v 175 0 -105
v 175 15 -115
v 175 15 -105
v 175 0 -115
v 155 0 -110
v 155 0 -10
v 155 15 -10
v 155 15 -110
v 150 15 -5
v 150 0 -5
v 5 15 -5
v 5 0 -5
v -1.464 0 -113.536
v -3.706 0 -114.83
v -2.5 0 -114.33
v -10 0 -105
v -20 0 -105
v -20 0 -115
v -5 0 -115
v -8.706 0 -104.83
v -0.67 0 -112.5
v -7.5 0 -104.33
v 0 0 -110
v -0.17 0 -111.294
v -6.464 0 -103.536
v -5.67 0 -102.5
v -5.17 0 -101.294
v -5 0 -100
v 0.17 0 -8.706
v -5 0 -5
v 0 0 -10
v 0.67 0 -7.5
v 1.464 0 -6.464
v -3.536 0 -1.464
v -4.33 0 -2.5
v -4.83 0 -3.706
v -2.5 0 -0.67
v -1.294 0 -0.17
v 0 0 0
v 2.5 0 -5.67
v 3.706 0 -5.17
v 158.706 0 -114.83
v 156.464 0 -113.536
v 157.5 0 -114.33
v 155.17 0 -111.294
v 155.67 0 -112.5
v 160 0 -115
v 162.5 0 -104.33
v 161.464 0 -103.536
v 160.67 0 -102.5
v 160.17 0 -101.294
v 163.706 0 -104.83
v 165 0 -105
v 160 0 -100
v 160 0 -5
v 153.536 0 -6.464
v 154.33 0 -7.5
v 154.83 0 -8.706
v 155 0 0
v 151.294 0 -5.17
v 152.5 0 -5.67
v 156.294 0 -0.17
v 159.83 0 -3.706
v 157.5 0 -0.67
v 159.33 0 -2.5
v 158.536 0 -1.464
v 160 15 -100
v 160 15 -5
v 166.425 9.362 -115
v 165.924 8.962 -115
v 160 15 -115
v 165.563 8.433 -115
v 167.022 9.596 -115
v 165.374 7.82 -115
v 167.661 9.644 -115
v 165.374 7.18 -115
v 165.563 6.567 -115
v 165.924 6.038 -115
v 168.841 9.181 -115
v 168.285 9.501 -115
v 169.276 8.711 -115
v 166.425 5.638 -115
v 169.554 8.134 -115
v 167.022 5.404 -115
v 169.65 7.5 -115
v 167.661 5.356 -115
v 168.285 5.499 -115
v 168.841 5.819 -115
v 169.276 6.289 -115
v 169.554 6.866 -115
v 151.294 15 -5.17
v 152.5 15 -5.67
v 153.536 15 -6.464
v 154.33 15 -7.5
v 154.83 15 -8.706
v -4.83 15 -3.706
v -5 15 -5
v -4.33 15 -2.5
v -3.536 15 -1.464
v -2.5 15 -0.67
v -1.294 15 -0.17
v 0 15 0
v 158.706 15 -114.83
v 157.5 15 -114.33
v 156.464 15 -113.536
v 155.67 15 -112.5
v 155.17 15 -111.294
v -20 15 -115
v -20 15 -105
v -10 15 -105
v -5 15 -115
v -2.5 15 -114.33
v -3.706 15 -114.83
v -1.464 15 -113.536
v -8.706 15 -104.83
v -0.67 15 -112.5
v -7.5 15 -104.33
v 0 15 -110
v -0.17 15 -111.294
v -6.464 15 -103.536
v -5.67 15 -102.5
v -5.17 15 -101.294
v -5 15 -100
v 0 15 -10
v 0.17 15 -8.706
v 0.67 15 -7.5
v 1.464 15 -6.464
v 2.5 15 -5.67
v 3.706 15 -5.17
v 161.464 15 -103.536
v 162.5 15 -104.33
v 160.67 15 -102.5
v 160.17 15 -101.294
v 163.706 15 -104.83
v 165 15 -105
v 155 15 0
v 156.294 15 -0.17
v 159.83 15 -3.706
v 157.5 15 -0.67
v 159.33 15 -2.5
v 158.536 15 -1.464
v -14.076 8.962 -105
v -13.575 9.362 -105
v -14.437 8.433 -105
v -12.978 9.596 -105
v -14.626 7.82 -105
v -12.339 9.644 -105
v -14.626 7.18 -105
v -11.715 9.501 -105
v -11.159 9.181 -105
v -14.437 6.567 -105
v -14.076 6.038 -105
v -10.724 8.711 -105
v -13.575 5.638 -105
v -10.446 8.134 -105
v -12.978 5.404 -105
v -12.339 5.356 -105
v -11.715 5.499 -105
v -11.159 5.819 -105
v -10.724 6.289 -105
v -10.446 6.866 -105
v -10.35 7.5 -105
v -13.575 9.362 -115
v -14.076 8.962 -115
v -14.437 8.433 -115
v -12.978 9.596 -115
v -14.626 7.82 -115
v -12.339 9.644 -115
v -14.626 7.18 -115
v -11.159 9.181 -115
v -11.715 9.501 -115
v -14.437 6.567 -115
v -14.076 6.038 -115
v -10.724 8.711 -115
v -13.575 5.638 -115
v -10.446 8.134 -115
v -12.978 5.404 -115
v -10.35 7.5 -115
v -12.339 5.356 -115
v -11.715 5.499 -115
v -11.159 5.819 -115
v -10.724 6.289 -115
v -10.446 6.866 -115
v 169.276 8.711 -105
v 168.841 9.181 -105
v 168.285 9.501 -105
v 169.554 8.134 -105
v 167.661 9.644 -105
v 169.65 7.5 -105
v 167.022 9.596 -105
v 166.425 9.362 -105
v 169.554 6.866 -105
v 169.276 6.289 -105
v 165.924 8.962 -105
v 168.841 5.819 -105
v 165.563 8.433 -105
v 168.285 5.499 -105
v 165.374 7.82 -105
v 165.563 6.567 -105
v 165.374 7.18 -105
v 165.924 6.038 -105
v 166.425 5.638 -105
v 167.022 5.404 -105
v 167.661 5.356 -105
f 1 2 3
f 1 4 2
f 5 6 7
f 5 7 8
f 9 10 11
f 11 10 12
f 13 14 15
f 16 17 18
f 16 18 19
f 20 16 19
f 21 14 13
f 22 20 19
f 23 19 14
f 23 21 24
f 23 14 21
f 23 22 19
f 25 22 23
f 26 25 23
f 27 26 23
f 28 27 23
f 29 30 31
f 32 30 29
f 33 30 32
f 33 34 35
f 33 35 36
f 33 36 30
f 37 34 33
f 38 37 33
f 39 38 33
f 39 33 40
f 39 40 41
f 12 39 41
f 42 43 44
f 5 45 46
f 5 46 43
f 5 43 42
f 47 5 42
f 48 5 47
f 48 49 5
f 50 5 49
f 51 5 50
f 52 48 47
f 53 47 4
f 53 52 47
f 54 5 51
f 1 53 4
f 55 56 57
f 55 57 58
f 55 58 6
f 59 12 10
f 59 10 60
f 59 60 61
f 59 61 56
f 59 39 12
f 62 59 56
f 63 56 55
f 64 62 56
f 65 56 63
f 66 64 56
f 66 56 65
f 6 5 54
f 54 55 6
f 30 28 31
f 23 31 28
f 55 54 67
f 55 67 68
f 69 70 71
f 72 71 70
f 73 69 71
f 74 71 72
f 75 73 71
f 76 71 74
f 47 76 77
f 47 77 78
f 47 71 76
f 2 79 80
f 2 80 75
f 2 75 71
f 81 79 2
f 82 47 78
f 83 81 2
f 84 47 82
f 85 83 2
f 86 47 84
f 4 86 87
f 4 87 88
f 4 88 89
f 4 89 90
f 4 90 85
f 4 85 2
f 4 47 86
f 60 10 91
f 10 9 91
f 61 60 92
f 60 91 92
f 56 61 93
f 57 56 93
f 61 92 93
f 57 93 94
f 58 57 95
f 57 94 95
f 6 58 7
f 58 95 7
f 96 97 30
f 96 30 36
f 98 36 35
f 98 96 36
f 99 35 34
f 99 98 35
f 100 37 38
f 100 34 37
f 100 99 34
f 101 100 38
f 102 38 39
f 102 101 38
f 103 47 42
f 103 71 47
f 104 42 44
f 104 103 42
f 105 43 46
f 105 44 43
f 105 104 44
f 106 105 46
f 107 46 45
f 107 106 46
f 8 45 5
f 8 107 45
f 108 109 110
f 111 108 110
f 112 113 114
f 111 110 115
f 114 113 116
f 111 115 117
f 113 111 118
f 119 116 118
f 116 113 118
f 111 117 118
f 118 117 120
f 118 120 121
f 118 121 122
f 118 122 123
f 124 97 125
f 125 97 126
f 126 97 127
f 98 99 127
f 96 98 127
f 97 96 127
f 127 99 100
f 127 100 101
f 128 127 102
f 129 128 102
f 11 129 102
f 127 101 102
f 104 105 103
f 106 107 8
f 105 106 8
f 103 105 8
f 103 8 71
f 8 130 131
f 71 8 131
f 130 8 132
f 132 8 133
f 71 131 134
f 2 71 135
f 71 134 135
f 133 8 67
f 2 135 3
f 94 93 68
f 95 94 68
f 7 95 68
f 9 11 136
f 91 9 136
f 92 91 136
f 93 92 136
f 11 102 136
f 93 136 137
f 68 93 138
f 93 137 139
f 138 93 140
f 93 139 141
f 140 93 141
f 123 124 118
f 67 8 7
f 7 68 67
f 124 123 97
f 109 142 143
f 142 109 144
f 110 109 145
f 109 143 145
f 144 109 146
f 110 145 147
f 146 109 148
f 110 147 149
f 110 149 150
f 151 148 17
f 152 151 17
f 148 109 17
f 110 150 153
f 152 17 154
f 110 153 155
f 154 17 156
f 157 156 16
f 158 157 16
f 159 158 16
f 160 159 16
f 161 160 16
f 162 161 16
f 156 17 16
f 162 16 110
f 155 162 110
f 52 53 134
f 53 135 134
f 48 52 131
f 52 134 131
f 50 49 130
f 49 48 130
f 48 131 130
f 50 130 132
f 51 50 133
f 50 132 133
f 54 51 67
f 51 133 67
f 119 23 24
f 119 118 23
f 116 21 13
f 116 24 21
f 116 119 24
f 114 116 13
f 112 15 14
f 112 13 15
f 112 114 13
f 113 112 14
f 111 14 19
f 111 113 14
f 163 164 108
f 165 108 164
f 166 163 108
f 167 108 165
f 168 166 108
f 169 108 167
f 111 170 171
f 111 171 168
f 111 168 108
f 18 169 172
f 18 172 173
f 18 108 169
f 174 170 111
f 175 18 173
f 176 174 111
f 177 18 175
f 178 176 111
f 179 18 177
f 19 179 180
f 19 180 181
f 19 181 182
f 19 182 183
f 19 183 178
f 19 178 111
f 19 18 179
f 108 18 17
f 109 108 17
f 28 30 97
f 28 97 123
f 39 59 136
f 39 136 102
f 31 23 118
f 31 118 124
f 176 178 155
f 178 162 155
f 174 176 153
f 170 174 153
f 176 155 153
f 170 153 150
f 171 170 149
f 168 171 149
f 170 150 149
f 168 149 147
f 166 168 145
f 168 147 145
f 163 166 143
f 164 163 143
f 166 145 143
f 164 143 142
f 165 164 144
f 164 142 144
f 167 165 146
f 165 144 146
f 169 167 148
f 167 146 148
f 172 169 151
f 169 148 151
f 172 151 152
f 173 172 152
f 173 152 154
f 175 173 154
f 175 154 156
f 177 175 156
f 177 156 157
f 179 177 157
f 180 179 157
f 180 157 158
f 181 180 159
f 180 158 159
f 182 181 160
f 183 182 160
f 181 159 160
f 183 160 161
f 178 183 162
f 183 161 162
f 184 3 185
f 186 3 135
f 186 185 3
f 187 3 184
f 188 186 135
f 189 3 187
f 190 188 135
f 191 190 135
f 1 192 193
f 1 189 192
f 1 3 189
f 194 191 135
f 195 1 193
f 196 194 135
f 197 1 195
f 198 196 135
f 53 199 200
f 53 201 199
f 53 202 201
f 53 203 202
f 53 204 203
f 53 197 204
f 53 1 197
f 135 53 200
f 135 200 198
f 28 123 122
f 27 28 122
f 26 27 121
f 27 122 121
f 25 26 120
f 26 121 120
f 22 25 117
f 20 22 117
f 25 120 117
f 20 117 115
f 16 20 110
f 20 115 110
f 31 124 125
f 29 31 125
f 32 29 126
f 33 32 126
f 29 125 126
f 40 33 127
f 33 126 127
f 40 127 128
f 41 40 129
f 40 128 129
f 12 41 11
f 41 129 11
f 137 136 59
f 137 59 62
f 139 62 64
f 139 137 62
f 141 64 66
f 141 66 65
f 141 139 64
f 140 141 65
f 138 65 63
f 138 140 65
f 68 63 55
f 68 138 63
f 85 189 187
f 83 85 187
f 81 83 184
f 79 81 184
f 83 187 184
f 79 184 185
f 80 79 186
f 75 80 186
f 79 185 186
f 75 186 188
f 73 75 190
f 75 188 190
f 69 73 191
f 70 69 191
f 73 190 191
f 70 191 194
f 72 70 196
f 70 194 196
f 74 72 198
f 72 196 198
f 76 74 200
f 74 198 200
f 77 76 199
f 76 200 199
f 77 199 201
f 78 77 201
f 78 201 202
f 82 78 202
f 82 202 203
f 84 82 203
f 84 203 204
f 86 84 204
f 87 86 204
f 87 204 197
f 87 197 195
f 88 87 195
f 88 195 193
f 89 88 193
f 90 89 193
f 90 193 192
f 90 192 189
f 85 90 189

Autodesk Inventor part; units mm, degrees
ref_plane "YZ Plane" through (0, 0, 0) normal (1, 0, 0) x (0, 1, 0)
ref_plane "XZ Plane" through (0, 0, 0) normal (0, 1, 0) x (-1, 0, 0)
ref_plane "XY Plane" through (0, 0, 0) normal (0, 0, 1) x (1, 0, 0)
sketch "Sketch1" plane through (0, 0, 0) normal (0, 1, 0) x (-1, 0, 0)
  line L0 (0, 0) -> (5, 0)
  line L1 (5, 0) -> (5, -115)
  line L2 (5, -115) -> (0, -115)
  line L3 (0, -115) -> (0, 0)
  line L4 (5, -115) -> (20, -115)
  line L5 (20, -115) -> (20, -105)
  line L6 (20, -105) -> (5, -105)
  line L7 (5, -105) -> (5, -115)
  line L8 (0, -10) -> (0, 0)
  point P0 (5, -105)
  dimension "d0" = 5
  dimension "d1" = 115
  dimension "d2" = 15
  dimension "d3" = 10
extrude "Extrusion1" add sketch "Sketch1" along normal blind 15
sketch "Sketch6" plane through (0, 0, 0) normal (1, 0, 0) x (0, 0, -1)
  line L0 (105, 0) -> (0, 0) projected
  line L1 (0, 0) -> (5, 0)
  line L2 (5, 0) -> (5, 15)
  line L3 (5, 15) -> (0, 15)
  line L4 (0, 15) -> (0, 0)
  dimension "d24" = 5
  dimension "d25" = 15
extrude "Extrusion4" add sketch "Sketch6" along normal blind 77.5
sketch "Sketch7" plane through (0, 0, 0) normal (0, -1, 0) x (1, 0, 0)
  line L0 (-20, -105) -> (-5, -105) projected
  line L1 (-20, -115) -> (-20, -105) projected
  line L2 (0, -115) -> (-20, -115) projected
  line L3 (0, -5) -> (0, -115) projected
  line L4 (0, -5) -> (77.5, -5) projected
  line L5 (77.5, 0) -> (77.5, -5) projected
  line L6 (-5, 0) -> (77.5, 0) projected
  line L7 (-5, -105) -> (-5, 0) projected
  line L8 (175, -105) -> (160, -105)
  line L9 (175, -115) -> (175, -105)
  line L10 (155, -115) -> (175, -115)
  line L11 (155, -5) -> (155, -115)
  line L12 (155, -5) -> (77.5, -5)
  line L13 (160, 0) -> (77.5, 0)
  line L14 (160, -105) -> (160, 0)
  point P0 (0, 0)
extrude "Extrusion5" add sketch "Sketch7" against normal up to surface (15 mm away) contours L13 L14 L8 L9 L10 L11 L12 L5
sketch "Sketch2" plane through (-20, 0, -105) normal (0, 0, 1) x (1, 0, 0)
  line L0 (0, 0) -> (0, 15) projected
  circle A0 centre (7.5, 7.5) radius 2.15
  line L1 (7.5, 7.5) -> (0, 7.5) construction
  line L2 (15, 15) -> (180, 15) projected
  line L3 (97.5, 15) -> (97.5, 37.3705) construction
  circle A1 centre (187.5, 7.5) radius 2.15
  point P0 (20, 0)
  dimension "d8" = 4.3
  dimension "d20" = 7.5
extrude "Extrusion2" cut sketch "Sketch2" against normal blind 15
fillet "Fillet2" radius 5 8 edges at (0, 7.5, -5) (0, 7.5, -115) (155, 7.5, -115) (160, 7.5, 0) (155, 7.5, -5) (-5, 7.5, 0) (-5, 7.5, -105) (160, 7.5, -105)
properties part number "Box_clamp"
